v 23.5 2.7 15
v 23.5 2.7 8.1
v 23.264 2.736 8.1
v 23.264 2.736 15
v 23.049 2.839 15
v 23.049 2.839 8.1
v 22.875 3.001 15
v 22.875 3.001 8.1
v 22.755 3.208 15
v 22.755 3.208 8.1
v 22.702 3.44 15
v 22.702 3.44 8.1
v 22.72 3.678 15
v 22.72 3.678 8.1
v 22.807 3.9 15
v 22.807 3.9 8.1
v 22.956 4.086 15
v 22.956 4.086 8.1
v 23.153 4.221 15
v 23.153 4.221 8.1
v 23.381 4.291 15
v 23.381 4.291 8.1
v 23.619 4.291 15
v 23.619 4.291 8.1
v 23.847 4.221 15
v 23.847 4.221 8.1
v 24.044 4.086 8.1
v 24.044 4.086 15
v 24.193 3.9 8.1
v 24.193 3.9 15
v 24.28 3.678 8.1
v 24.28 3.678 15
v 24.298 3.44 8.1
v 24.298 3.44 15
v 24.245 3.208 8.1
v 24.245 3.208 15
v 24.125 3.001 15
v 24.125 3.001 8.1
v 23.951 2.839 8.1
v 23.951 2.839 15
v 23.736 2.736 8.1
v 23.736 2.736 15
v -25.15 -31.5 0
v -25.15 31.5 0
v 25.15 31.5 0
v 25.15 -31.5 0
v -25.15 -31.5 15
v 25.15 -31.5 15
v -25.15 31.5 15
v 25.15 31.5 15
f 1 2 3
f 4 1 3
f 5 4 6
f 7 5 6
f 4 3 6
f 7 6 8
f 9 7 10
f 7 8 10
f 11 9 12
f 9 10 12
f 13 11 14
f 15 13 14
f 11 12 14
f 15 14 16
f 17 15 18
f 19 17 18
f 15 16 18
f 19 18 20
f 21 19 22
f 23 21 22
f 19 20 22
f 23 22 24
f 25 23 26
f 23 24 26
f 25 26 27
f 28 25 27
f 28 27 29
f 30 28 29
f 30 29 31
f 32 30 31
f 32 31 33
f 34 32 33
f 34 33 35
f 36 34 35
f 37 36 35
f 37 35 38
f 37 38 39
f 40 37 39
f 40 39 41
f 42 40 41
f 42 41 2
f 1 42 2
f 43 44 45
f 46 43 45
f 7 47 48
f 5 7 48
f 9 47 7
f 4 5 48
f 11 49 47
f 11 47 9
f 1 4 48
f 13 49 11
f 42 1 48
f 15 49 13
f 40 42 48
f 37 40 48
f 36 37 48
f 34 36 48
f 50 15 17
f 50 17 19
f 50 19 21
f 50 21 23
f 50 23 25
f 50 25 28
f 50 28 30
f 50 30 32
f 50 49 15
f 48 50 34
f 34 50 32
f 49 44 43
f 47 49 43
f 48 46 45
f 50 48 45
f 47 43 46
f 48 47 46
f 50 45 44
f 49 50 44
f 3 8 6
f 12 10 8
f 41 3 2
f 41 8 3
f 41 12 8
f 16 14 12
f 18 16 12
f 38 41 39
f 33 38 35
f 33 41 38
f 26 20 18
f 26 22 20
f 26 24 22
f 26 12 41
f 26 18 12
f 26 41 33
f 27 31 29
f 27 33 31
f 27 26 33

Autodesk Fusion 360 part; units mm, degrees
sketch "Skizze1" plane through (0, 0, 0) normal (0, 0, 1) x (1, 0, 0)
  line L0 (0, 0) -> (85, 0)
  line L1 (85, 0) -> (85, 56)
  line L2 (85, 56) -> (0, 56)
  line L3 (0, 56) -> (0, 0)
  dimension "d1" = 85
  dimension "d2" = 56
extrude "Extrusion1" add sketch "Skizze1" along normal blind 15
sketch "Skizze2" plane through (0, 0, 15) normal (0, 0, 1) x (-1, 0, 0)
  line L0 (0, -56) -> (0, 0)
  line L1 (0, 0) -> (-85, 0)
  line L2 (-85, 0) -> (-85, -56)
  line L3 (-85, -56) -> (0, -56)
  point P0 (-23.5, -52.5)
  point P1 (-81.5, -52.5)
  point P2 (-81.5, -3.5)
  point P3 (-23.5, -3.5)
  dimension "d5" = 3.5
  dimension "d6" = 3.5
  dimension "d7" = 3.5
  dimension "d8" = 3.5
  dimension "d9" = 3.5
  dimension "d10" = 3.5
  dimension "d11" = 58
  dimension "d12" = 58
hole "Bohrung1" at (23.5, 52.5, 15) at (81.5, 52.5, 15) at (81.5, 3.5, 15) at (23.5, 3.5, 15) direction (0, 0, -1) diameter 1.6 end through all

Autodesk Fusion 360 part; units mm, degrees
sketch "Skizze1" plane through (0, 0, 0) normal (0, 0, 1) x (1, 0, 0)
  line L0 (0, 0) -> (50, 0)
  line L1 (50, 0) -> (50, 19)
  line L2 (50, 19) -> (0, 19)
  line L3 (0, 19) -> (0, 0)
  dimension "d1" = 50
  dimension "d2" = 19
extrude "Extrusion1" add sketch "Skizze1" along normal blind 1
sketch "Skizze2" plane through (0, 0, 1) normal (0, 0, 1) x (-1, 0, 0)
  line L0 (0, -19) -> (0, 0)
  line L1 (0, 0) -> (-50, 0)
  line L2 (-50, 0) -> (-50, -19)
  line L3 (-50, -19) -> (0, -19)
  point P0 (-2.7, -16.3)
  point P1 (-2.7, -2.7)
  dimension "d5" = 2.7
  dimension "d6" = 2.7
  dimension "d7" = 2.7
  dimension "d8" = 2.7
hole "Bohrung1" at (2.7, 2.7, 1) direction (0, 0, -1) diameter 1.6 depth 3 tip angle 180
hole "Bohrung2" at (2.7, 16.3, 1) direction (0, 0, -1) diameter 1.6 depth 3 tip angle 180

Autodesk Fusion 360 part; units mm, degrees
sketch "Skizze1" plane through (0, 0, 0) normal (0, 0, 1) x (1, 0, 0)
  line L0 (25.15, 31.5) -> (-25.15, 31.5)
  line L1 (-25.15, 31.5) -> (-25.15, -31.5)
  line L2 (-25.15, -31.5) -> (25.15, -31.5)
  line L3 (25.15, -31.5) -> (25.15, 31.5)
  line L4 (25.15, 31.5) -> (-25.15, -31.5) construction
  line L5 (-25.15, 31.5) -> (25.15, -31.5) construction
  dimension "d1" = 63
  dimension "d2" = 50.3
extrude "Extrusion1" add sketch "Skizze1" along normal blind 8.1
